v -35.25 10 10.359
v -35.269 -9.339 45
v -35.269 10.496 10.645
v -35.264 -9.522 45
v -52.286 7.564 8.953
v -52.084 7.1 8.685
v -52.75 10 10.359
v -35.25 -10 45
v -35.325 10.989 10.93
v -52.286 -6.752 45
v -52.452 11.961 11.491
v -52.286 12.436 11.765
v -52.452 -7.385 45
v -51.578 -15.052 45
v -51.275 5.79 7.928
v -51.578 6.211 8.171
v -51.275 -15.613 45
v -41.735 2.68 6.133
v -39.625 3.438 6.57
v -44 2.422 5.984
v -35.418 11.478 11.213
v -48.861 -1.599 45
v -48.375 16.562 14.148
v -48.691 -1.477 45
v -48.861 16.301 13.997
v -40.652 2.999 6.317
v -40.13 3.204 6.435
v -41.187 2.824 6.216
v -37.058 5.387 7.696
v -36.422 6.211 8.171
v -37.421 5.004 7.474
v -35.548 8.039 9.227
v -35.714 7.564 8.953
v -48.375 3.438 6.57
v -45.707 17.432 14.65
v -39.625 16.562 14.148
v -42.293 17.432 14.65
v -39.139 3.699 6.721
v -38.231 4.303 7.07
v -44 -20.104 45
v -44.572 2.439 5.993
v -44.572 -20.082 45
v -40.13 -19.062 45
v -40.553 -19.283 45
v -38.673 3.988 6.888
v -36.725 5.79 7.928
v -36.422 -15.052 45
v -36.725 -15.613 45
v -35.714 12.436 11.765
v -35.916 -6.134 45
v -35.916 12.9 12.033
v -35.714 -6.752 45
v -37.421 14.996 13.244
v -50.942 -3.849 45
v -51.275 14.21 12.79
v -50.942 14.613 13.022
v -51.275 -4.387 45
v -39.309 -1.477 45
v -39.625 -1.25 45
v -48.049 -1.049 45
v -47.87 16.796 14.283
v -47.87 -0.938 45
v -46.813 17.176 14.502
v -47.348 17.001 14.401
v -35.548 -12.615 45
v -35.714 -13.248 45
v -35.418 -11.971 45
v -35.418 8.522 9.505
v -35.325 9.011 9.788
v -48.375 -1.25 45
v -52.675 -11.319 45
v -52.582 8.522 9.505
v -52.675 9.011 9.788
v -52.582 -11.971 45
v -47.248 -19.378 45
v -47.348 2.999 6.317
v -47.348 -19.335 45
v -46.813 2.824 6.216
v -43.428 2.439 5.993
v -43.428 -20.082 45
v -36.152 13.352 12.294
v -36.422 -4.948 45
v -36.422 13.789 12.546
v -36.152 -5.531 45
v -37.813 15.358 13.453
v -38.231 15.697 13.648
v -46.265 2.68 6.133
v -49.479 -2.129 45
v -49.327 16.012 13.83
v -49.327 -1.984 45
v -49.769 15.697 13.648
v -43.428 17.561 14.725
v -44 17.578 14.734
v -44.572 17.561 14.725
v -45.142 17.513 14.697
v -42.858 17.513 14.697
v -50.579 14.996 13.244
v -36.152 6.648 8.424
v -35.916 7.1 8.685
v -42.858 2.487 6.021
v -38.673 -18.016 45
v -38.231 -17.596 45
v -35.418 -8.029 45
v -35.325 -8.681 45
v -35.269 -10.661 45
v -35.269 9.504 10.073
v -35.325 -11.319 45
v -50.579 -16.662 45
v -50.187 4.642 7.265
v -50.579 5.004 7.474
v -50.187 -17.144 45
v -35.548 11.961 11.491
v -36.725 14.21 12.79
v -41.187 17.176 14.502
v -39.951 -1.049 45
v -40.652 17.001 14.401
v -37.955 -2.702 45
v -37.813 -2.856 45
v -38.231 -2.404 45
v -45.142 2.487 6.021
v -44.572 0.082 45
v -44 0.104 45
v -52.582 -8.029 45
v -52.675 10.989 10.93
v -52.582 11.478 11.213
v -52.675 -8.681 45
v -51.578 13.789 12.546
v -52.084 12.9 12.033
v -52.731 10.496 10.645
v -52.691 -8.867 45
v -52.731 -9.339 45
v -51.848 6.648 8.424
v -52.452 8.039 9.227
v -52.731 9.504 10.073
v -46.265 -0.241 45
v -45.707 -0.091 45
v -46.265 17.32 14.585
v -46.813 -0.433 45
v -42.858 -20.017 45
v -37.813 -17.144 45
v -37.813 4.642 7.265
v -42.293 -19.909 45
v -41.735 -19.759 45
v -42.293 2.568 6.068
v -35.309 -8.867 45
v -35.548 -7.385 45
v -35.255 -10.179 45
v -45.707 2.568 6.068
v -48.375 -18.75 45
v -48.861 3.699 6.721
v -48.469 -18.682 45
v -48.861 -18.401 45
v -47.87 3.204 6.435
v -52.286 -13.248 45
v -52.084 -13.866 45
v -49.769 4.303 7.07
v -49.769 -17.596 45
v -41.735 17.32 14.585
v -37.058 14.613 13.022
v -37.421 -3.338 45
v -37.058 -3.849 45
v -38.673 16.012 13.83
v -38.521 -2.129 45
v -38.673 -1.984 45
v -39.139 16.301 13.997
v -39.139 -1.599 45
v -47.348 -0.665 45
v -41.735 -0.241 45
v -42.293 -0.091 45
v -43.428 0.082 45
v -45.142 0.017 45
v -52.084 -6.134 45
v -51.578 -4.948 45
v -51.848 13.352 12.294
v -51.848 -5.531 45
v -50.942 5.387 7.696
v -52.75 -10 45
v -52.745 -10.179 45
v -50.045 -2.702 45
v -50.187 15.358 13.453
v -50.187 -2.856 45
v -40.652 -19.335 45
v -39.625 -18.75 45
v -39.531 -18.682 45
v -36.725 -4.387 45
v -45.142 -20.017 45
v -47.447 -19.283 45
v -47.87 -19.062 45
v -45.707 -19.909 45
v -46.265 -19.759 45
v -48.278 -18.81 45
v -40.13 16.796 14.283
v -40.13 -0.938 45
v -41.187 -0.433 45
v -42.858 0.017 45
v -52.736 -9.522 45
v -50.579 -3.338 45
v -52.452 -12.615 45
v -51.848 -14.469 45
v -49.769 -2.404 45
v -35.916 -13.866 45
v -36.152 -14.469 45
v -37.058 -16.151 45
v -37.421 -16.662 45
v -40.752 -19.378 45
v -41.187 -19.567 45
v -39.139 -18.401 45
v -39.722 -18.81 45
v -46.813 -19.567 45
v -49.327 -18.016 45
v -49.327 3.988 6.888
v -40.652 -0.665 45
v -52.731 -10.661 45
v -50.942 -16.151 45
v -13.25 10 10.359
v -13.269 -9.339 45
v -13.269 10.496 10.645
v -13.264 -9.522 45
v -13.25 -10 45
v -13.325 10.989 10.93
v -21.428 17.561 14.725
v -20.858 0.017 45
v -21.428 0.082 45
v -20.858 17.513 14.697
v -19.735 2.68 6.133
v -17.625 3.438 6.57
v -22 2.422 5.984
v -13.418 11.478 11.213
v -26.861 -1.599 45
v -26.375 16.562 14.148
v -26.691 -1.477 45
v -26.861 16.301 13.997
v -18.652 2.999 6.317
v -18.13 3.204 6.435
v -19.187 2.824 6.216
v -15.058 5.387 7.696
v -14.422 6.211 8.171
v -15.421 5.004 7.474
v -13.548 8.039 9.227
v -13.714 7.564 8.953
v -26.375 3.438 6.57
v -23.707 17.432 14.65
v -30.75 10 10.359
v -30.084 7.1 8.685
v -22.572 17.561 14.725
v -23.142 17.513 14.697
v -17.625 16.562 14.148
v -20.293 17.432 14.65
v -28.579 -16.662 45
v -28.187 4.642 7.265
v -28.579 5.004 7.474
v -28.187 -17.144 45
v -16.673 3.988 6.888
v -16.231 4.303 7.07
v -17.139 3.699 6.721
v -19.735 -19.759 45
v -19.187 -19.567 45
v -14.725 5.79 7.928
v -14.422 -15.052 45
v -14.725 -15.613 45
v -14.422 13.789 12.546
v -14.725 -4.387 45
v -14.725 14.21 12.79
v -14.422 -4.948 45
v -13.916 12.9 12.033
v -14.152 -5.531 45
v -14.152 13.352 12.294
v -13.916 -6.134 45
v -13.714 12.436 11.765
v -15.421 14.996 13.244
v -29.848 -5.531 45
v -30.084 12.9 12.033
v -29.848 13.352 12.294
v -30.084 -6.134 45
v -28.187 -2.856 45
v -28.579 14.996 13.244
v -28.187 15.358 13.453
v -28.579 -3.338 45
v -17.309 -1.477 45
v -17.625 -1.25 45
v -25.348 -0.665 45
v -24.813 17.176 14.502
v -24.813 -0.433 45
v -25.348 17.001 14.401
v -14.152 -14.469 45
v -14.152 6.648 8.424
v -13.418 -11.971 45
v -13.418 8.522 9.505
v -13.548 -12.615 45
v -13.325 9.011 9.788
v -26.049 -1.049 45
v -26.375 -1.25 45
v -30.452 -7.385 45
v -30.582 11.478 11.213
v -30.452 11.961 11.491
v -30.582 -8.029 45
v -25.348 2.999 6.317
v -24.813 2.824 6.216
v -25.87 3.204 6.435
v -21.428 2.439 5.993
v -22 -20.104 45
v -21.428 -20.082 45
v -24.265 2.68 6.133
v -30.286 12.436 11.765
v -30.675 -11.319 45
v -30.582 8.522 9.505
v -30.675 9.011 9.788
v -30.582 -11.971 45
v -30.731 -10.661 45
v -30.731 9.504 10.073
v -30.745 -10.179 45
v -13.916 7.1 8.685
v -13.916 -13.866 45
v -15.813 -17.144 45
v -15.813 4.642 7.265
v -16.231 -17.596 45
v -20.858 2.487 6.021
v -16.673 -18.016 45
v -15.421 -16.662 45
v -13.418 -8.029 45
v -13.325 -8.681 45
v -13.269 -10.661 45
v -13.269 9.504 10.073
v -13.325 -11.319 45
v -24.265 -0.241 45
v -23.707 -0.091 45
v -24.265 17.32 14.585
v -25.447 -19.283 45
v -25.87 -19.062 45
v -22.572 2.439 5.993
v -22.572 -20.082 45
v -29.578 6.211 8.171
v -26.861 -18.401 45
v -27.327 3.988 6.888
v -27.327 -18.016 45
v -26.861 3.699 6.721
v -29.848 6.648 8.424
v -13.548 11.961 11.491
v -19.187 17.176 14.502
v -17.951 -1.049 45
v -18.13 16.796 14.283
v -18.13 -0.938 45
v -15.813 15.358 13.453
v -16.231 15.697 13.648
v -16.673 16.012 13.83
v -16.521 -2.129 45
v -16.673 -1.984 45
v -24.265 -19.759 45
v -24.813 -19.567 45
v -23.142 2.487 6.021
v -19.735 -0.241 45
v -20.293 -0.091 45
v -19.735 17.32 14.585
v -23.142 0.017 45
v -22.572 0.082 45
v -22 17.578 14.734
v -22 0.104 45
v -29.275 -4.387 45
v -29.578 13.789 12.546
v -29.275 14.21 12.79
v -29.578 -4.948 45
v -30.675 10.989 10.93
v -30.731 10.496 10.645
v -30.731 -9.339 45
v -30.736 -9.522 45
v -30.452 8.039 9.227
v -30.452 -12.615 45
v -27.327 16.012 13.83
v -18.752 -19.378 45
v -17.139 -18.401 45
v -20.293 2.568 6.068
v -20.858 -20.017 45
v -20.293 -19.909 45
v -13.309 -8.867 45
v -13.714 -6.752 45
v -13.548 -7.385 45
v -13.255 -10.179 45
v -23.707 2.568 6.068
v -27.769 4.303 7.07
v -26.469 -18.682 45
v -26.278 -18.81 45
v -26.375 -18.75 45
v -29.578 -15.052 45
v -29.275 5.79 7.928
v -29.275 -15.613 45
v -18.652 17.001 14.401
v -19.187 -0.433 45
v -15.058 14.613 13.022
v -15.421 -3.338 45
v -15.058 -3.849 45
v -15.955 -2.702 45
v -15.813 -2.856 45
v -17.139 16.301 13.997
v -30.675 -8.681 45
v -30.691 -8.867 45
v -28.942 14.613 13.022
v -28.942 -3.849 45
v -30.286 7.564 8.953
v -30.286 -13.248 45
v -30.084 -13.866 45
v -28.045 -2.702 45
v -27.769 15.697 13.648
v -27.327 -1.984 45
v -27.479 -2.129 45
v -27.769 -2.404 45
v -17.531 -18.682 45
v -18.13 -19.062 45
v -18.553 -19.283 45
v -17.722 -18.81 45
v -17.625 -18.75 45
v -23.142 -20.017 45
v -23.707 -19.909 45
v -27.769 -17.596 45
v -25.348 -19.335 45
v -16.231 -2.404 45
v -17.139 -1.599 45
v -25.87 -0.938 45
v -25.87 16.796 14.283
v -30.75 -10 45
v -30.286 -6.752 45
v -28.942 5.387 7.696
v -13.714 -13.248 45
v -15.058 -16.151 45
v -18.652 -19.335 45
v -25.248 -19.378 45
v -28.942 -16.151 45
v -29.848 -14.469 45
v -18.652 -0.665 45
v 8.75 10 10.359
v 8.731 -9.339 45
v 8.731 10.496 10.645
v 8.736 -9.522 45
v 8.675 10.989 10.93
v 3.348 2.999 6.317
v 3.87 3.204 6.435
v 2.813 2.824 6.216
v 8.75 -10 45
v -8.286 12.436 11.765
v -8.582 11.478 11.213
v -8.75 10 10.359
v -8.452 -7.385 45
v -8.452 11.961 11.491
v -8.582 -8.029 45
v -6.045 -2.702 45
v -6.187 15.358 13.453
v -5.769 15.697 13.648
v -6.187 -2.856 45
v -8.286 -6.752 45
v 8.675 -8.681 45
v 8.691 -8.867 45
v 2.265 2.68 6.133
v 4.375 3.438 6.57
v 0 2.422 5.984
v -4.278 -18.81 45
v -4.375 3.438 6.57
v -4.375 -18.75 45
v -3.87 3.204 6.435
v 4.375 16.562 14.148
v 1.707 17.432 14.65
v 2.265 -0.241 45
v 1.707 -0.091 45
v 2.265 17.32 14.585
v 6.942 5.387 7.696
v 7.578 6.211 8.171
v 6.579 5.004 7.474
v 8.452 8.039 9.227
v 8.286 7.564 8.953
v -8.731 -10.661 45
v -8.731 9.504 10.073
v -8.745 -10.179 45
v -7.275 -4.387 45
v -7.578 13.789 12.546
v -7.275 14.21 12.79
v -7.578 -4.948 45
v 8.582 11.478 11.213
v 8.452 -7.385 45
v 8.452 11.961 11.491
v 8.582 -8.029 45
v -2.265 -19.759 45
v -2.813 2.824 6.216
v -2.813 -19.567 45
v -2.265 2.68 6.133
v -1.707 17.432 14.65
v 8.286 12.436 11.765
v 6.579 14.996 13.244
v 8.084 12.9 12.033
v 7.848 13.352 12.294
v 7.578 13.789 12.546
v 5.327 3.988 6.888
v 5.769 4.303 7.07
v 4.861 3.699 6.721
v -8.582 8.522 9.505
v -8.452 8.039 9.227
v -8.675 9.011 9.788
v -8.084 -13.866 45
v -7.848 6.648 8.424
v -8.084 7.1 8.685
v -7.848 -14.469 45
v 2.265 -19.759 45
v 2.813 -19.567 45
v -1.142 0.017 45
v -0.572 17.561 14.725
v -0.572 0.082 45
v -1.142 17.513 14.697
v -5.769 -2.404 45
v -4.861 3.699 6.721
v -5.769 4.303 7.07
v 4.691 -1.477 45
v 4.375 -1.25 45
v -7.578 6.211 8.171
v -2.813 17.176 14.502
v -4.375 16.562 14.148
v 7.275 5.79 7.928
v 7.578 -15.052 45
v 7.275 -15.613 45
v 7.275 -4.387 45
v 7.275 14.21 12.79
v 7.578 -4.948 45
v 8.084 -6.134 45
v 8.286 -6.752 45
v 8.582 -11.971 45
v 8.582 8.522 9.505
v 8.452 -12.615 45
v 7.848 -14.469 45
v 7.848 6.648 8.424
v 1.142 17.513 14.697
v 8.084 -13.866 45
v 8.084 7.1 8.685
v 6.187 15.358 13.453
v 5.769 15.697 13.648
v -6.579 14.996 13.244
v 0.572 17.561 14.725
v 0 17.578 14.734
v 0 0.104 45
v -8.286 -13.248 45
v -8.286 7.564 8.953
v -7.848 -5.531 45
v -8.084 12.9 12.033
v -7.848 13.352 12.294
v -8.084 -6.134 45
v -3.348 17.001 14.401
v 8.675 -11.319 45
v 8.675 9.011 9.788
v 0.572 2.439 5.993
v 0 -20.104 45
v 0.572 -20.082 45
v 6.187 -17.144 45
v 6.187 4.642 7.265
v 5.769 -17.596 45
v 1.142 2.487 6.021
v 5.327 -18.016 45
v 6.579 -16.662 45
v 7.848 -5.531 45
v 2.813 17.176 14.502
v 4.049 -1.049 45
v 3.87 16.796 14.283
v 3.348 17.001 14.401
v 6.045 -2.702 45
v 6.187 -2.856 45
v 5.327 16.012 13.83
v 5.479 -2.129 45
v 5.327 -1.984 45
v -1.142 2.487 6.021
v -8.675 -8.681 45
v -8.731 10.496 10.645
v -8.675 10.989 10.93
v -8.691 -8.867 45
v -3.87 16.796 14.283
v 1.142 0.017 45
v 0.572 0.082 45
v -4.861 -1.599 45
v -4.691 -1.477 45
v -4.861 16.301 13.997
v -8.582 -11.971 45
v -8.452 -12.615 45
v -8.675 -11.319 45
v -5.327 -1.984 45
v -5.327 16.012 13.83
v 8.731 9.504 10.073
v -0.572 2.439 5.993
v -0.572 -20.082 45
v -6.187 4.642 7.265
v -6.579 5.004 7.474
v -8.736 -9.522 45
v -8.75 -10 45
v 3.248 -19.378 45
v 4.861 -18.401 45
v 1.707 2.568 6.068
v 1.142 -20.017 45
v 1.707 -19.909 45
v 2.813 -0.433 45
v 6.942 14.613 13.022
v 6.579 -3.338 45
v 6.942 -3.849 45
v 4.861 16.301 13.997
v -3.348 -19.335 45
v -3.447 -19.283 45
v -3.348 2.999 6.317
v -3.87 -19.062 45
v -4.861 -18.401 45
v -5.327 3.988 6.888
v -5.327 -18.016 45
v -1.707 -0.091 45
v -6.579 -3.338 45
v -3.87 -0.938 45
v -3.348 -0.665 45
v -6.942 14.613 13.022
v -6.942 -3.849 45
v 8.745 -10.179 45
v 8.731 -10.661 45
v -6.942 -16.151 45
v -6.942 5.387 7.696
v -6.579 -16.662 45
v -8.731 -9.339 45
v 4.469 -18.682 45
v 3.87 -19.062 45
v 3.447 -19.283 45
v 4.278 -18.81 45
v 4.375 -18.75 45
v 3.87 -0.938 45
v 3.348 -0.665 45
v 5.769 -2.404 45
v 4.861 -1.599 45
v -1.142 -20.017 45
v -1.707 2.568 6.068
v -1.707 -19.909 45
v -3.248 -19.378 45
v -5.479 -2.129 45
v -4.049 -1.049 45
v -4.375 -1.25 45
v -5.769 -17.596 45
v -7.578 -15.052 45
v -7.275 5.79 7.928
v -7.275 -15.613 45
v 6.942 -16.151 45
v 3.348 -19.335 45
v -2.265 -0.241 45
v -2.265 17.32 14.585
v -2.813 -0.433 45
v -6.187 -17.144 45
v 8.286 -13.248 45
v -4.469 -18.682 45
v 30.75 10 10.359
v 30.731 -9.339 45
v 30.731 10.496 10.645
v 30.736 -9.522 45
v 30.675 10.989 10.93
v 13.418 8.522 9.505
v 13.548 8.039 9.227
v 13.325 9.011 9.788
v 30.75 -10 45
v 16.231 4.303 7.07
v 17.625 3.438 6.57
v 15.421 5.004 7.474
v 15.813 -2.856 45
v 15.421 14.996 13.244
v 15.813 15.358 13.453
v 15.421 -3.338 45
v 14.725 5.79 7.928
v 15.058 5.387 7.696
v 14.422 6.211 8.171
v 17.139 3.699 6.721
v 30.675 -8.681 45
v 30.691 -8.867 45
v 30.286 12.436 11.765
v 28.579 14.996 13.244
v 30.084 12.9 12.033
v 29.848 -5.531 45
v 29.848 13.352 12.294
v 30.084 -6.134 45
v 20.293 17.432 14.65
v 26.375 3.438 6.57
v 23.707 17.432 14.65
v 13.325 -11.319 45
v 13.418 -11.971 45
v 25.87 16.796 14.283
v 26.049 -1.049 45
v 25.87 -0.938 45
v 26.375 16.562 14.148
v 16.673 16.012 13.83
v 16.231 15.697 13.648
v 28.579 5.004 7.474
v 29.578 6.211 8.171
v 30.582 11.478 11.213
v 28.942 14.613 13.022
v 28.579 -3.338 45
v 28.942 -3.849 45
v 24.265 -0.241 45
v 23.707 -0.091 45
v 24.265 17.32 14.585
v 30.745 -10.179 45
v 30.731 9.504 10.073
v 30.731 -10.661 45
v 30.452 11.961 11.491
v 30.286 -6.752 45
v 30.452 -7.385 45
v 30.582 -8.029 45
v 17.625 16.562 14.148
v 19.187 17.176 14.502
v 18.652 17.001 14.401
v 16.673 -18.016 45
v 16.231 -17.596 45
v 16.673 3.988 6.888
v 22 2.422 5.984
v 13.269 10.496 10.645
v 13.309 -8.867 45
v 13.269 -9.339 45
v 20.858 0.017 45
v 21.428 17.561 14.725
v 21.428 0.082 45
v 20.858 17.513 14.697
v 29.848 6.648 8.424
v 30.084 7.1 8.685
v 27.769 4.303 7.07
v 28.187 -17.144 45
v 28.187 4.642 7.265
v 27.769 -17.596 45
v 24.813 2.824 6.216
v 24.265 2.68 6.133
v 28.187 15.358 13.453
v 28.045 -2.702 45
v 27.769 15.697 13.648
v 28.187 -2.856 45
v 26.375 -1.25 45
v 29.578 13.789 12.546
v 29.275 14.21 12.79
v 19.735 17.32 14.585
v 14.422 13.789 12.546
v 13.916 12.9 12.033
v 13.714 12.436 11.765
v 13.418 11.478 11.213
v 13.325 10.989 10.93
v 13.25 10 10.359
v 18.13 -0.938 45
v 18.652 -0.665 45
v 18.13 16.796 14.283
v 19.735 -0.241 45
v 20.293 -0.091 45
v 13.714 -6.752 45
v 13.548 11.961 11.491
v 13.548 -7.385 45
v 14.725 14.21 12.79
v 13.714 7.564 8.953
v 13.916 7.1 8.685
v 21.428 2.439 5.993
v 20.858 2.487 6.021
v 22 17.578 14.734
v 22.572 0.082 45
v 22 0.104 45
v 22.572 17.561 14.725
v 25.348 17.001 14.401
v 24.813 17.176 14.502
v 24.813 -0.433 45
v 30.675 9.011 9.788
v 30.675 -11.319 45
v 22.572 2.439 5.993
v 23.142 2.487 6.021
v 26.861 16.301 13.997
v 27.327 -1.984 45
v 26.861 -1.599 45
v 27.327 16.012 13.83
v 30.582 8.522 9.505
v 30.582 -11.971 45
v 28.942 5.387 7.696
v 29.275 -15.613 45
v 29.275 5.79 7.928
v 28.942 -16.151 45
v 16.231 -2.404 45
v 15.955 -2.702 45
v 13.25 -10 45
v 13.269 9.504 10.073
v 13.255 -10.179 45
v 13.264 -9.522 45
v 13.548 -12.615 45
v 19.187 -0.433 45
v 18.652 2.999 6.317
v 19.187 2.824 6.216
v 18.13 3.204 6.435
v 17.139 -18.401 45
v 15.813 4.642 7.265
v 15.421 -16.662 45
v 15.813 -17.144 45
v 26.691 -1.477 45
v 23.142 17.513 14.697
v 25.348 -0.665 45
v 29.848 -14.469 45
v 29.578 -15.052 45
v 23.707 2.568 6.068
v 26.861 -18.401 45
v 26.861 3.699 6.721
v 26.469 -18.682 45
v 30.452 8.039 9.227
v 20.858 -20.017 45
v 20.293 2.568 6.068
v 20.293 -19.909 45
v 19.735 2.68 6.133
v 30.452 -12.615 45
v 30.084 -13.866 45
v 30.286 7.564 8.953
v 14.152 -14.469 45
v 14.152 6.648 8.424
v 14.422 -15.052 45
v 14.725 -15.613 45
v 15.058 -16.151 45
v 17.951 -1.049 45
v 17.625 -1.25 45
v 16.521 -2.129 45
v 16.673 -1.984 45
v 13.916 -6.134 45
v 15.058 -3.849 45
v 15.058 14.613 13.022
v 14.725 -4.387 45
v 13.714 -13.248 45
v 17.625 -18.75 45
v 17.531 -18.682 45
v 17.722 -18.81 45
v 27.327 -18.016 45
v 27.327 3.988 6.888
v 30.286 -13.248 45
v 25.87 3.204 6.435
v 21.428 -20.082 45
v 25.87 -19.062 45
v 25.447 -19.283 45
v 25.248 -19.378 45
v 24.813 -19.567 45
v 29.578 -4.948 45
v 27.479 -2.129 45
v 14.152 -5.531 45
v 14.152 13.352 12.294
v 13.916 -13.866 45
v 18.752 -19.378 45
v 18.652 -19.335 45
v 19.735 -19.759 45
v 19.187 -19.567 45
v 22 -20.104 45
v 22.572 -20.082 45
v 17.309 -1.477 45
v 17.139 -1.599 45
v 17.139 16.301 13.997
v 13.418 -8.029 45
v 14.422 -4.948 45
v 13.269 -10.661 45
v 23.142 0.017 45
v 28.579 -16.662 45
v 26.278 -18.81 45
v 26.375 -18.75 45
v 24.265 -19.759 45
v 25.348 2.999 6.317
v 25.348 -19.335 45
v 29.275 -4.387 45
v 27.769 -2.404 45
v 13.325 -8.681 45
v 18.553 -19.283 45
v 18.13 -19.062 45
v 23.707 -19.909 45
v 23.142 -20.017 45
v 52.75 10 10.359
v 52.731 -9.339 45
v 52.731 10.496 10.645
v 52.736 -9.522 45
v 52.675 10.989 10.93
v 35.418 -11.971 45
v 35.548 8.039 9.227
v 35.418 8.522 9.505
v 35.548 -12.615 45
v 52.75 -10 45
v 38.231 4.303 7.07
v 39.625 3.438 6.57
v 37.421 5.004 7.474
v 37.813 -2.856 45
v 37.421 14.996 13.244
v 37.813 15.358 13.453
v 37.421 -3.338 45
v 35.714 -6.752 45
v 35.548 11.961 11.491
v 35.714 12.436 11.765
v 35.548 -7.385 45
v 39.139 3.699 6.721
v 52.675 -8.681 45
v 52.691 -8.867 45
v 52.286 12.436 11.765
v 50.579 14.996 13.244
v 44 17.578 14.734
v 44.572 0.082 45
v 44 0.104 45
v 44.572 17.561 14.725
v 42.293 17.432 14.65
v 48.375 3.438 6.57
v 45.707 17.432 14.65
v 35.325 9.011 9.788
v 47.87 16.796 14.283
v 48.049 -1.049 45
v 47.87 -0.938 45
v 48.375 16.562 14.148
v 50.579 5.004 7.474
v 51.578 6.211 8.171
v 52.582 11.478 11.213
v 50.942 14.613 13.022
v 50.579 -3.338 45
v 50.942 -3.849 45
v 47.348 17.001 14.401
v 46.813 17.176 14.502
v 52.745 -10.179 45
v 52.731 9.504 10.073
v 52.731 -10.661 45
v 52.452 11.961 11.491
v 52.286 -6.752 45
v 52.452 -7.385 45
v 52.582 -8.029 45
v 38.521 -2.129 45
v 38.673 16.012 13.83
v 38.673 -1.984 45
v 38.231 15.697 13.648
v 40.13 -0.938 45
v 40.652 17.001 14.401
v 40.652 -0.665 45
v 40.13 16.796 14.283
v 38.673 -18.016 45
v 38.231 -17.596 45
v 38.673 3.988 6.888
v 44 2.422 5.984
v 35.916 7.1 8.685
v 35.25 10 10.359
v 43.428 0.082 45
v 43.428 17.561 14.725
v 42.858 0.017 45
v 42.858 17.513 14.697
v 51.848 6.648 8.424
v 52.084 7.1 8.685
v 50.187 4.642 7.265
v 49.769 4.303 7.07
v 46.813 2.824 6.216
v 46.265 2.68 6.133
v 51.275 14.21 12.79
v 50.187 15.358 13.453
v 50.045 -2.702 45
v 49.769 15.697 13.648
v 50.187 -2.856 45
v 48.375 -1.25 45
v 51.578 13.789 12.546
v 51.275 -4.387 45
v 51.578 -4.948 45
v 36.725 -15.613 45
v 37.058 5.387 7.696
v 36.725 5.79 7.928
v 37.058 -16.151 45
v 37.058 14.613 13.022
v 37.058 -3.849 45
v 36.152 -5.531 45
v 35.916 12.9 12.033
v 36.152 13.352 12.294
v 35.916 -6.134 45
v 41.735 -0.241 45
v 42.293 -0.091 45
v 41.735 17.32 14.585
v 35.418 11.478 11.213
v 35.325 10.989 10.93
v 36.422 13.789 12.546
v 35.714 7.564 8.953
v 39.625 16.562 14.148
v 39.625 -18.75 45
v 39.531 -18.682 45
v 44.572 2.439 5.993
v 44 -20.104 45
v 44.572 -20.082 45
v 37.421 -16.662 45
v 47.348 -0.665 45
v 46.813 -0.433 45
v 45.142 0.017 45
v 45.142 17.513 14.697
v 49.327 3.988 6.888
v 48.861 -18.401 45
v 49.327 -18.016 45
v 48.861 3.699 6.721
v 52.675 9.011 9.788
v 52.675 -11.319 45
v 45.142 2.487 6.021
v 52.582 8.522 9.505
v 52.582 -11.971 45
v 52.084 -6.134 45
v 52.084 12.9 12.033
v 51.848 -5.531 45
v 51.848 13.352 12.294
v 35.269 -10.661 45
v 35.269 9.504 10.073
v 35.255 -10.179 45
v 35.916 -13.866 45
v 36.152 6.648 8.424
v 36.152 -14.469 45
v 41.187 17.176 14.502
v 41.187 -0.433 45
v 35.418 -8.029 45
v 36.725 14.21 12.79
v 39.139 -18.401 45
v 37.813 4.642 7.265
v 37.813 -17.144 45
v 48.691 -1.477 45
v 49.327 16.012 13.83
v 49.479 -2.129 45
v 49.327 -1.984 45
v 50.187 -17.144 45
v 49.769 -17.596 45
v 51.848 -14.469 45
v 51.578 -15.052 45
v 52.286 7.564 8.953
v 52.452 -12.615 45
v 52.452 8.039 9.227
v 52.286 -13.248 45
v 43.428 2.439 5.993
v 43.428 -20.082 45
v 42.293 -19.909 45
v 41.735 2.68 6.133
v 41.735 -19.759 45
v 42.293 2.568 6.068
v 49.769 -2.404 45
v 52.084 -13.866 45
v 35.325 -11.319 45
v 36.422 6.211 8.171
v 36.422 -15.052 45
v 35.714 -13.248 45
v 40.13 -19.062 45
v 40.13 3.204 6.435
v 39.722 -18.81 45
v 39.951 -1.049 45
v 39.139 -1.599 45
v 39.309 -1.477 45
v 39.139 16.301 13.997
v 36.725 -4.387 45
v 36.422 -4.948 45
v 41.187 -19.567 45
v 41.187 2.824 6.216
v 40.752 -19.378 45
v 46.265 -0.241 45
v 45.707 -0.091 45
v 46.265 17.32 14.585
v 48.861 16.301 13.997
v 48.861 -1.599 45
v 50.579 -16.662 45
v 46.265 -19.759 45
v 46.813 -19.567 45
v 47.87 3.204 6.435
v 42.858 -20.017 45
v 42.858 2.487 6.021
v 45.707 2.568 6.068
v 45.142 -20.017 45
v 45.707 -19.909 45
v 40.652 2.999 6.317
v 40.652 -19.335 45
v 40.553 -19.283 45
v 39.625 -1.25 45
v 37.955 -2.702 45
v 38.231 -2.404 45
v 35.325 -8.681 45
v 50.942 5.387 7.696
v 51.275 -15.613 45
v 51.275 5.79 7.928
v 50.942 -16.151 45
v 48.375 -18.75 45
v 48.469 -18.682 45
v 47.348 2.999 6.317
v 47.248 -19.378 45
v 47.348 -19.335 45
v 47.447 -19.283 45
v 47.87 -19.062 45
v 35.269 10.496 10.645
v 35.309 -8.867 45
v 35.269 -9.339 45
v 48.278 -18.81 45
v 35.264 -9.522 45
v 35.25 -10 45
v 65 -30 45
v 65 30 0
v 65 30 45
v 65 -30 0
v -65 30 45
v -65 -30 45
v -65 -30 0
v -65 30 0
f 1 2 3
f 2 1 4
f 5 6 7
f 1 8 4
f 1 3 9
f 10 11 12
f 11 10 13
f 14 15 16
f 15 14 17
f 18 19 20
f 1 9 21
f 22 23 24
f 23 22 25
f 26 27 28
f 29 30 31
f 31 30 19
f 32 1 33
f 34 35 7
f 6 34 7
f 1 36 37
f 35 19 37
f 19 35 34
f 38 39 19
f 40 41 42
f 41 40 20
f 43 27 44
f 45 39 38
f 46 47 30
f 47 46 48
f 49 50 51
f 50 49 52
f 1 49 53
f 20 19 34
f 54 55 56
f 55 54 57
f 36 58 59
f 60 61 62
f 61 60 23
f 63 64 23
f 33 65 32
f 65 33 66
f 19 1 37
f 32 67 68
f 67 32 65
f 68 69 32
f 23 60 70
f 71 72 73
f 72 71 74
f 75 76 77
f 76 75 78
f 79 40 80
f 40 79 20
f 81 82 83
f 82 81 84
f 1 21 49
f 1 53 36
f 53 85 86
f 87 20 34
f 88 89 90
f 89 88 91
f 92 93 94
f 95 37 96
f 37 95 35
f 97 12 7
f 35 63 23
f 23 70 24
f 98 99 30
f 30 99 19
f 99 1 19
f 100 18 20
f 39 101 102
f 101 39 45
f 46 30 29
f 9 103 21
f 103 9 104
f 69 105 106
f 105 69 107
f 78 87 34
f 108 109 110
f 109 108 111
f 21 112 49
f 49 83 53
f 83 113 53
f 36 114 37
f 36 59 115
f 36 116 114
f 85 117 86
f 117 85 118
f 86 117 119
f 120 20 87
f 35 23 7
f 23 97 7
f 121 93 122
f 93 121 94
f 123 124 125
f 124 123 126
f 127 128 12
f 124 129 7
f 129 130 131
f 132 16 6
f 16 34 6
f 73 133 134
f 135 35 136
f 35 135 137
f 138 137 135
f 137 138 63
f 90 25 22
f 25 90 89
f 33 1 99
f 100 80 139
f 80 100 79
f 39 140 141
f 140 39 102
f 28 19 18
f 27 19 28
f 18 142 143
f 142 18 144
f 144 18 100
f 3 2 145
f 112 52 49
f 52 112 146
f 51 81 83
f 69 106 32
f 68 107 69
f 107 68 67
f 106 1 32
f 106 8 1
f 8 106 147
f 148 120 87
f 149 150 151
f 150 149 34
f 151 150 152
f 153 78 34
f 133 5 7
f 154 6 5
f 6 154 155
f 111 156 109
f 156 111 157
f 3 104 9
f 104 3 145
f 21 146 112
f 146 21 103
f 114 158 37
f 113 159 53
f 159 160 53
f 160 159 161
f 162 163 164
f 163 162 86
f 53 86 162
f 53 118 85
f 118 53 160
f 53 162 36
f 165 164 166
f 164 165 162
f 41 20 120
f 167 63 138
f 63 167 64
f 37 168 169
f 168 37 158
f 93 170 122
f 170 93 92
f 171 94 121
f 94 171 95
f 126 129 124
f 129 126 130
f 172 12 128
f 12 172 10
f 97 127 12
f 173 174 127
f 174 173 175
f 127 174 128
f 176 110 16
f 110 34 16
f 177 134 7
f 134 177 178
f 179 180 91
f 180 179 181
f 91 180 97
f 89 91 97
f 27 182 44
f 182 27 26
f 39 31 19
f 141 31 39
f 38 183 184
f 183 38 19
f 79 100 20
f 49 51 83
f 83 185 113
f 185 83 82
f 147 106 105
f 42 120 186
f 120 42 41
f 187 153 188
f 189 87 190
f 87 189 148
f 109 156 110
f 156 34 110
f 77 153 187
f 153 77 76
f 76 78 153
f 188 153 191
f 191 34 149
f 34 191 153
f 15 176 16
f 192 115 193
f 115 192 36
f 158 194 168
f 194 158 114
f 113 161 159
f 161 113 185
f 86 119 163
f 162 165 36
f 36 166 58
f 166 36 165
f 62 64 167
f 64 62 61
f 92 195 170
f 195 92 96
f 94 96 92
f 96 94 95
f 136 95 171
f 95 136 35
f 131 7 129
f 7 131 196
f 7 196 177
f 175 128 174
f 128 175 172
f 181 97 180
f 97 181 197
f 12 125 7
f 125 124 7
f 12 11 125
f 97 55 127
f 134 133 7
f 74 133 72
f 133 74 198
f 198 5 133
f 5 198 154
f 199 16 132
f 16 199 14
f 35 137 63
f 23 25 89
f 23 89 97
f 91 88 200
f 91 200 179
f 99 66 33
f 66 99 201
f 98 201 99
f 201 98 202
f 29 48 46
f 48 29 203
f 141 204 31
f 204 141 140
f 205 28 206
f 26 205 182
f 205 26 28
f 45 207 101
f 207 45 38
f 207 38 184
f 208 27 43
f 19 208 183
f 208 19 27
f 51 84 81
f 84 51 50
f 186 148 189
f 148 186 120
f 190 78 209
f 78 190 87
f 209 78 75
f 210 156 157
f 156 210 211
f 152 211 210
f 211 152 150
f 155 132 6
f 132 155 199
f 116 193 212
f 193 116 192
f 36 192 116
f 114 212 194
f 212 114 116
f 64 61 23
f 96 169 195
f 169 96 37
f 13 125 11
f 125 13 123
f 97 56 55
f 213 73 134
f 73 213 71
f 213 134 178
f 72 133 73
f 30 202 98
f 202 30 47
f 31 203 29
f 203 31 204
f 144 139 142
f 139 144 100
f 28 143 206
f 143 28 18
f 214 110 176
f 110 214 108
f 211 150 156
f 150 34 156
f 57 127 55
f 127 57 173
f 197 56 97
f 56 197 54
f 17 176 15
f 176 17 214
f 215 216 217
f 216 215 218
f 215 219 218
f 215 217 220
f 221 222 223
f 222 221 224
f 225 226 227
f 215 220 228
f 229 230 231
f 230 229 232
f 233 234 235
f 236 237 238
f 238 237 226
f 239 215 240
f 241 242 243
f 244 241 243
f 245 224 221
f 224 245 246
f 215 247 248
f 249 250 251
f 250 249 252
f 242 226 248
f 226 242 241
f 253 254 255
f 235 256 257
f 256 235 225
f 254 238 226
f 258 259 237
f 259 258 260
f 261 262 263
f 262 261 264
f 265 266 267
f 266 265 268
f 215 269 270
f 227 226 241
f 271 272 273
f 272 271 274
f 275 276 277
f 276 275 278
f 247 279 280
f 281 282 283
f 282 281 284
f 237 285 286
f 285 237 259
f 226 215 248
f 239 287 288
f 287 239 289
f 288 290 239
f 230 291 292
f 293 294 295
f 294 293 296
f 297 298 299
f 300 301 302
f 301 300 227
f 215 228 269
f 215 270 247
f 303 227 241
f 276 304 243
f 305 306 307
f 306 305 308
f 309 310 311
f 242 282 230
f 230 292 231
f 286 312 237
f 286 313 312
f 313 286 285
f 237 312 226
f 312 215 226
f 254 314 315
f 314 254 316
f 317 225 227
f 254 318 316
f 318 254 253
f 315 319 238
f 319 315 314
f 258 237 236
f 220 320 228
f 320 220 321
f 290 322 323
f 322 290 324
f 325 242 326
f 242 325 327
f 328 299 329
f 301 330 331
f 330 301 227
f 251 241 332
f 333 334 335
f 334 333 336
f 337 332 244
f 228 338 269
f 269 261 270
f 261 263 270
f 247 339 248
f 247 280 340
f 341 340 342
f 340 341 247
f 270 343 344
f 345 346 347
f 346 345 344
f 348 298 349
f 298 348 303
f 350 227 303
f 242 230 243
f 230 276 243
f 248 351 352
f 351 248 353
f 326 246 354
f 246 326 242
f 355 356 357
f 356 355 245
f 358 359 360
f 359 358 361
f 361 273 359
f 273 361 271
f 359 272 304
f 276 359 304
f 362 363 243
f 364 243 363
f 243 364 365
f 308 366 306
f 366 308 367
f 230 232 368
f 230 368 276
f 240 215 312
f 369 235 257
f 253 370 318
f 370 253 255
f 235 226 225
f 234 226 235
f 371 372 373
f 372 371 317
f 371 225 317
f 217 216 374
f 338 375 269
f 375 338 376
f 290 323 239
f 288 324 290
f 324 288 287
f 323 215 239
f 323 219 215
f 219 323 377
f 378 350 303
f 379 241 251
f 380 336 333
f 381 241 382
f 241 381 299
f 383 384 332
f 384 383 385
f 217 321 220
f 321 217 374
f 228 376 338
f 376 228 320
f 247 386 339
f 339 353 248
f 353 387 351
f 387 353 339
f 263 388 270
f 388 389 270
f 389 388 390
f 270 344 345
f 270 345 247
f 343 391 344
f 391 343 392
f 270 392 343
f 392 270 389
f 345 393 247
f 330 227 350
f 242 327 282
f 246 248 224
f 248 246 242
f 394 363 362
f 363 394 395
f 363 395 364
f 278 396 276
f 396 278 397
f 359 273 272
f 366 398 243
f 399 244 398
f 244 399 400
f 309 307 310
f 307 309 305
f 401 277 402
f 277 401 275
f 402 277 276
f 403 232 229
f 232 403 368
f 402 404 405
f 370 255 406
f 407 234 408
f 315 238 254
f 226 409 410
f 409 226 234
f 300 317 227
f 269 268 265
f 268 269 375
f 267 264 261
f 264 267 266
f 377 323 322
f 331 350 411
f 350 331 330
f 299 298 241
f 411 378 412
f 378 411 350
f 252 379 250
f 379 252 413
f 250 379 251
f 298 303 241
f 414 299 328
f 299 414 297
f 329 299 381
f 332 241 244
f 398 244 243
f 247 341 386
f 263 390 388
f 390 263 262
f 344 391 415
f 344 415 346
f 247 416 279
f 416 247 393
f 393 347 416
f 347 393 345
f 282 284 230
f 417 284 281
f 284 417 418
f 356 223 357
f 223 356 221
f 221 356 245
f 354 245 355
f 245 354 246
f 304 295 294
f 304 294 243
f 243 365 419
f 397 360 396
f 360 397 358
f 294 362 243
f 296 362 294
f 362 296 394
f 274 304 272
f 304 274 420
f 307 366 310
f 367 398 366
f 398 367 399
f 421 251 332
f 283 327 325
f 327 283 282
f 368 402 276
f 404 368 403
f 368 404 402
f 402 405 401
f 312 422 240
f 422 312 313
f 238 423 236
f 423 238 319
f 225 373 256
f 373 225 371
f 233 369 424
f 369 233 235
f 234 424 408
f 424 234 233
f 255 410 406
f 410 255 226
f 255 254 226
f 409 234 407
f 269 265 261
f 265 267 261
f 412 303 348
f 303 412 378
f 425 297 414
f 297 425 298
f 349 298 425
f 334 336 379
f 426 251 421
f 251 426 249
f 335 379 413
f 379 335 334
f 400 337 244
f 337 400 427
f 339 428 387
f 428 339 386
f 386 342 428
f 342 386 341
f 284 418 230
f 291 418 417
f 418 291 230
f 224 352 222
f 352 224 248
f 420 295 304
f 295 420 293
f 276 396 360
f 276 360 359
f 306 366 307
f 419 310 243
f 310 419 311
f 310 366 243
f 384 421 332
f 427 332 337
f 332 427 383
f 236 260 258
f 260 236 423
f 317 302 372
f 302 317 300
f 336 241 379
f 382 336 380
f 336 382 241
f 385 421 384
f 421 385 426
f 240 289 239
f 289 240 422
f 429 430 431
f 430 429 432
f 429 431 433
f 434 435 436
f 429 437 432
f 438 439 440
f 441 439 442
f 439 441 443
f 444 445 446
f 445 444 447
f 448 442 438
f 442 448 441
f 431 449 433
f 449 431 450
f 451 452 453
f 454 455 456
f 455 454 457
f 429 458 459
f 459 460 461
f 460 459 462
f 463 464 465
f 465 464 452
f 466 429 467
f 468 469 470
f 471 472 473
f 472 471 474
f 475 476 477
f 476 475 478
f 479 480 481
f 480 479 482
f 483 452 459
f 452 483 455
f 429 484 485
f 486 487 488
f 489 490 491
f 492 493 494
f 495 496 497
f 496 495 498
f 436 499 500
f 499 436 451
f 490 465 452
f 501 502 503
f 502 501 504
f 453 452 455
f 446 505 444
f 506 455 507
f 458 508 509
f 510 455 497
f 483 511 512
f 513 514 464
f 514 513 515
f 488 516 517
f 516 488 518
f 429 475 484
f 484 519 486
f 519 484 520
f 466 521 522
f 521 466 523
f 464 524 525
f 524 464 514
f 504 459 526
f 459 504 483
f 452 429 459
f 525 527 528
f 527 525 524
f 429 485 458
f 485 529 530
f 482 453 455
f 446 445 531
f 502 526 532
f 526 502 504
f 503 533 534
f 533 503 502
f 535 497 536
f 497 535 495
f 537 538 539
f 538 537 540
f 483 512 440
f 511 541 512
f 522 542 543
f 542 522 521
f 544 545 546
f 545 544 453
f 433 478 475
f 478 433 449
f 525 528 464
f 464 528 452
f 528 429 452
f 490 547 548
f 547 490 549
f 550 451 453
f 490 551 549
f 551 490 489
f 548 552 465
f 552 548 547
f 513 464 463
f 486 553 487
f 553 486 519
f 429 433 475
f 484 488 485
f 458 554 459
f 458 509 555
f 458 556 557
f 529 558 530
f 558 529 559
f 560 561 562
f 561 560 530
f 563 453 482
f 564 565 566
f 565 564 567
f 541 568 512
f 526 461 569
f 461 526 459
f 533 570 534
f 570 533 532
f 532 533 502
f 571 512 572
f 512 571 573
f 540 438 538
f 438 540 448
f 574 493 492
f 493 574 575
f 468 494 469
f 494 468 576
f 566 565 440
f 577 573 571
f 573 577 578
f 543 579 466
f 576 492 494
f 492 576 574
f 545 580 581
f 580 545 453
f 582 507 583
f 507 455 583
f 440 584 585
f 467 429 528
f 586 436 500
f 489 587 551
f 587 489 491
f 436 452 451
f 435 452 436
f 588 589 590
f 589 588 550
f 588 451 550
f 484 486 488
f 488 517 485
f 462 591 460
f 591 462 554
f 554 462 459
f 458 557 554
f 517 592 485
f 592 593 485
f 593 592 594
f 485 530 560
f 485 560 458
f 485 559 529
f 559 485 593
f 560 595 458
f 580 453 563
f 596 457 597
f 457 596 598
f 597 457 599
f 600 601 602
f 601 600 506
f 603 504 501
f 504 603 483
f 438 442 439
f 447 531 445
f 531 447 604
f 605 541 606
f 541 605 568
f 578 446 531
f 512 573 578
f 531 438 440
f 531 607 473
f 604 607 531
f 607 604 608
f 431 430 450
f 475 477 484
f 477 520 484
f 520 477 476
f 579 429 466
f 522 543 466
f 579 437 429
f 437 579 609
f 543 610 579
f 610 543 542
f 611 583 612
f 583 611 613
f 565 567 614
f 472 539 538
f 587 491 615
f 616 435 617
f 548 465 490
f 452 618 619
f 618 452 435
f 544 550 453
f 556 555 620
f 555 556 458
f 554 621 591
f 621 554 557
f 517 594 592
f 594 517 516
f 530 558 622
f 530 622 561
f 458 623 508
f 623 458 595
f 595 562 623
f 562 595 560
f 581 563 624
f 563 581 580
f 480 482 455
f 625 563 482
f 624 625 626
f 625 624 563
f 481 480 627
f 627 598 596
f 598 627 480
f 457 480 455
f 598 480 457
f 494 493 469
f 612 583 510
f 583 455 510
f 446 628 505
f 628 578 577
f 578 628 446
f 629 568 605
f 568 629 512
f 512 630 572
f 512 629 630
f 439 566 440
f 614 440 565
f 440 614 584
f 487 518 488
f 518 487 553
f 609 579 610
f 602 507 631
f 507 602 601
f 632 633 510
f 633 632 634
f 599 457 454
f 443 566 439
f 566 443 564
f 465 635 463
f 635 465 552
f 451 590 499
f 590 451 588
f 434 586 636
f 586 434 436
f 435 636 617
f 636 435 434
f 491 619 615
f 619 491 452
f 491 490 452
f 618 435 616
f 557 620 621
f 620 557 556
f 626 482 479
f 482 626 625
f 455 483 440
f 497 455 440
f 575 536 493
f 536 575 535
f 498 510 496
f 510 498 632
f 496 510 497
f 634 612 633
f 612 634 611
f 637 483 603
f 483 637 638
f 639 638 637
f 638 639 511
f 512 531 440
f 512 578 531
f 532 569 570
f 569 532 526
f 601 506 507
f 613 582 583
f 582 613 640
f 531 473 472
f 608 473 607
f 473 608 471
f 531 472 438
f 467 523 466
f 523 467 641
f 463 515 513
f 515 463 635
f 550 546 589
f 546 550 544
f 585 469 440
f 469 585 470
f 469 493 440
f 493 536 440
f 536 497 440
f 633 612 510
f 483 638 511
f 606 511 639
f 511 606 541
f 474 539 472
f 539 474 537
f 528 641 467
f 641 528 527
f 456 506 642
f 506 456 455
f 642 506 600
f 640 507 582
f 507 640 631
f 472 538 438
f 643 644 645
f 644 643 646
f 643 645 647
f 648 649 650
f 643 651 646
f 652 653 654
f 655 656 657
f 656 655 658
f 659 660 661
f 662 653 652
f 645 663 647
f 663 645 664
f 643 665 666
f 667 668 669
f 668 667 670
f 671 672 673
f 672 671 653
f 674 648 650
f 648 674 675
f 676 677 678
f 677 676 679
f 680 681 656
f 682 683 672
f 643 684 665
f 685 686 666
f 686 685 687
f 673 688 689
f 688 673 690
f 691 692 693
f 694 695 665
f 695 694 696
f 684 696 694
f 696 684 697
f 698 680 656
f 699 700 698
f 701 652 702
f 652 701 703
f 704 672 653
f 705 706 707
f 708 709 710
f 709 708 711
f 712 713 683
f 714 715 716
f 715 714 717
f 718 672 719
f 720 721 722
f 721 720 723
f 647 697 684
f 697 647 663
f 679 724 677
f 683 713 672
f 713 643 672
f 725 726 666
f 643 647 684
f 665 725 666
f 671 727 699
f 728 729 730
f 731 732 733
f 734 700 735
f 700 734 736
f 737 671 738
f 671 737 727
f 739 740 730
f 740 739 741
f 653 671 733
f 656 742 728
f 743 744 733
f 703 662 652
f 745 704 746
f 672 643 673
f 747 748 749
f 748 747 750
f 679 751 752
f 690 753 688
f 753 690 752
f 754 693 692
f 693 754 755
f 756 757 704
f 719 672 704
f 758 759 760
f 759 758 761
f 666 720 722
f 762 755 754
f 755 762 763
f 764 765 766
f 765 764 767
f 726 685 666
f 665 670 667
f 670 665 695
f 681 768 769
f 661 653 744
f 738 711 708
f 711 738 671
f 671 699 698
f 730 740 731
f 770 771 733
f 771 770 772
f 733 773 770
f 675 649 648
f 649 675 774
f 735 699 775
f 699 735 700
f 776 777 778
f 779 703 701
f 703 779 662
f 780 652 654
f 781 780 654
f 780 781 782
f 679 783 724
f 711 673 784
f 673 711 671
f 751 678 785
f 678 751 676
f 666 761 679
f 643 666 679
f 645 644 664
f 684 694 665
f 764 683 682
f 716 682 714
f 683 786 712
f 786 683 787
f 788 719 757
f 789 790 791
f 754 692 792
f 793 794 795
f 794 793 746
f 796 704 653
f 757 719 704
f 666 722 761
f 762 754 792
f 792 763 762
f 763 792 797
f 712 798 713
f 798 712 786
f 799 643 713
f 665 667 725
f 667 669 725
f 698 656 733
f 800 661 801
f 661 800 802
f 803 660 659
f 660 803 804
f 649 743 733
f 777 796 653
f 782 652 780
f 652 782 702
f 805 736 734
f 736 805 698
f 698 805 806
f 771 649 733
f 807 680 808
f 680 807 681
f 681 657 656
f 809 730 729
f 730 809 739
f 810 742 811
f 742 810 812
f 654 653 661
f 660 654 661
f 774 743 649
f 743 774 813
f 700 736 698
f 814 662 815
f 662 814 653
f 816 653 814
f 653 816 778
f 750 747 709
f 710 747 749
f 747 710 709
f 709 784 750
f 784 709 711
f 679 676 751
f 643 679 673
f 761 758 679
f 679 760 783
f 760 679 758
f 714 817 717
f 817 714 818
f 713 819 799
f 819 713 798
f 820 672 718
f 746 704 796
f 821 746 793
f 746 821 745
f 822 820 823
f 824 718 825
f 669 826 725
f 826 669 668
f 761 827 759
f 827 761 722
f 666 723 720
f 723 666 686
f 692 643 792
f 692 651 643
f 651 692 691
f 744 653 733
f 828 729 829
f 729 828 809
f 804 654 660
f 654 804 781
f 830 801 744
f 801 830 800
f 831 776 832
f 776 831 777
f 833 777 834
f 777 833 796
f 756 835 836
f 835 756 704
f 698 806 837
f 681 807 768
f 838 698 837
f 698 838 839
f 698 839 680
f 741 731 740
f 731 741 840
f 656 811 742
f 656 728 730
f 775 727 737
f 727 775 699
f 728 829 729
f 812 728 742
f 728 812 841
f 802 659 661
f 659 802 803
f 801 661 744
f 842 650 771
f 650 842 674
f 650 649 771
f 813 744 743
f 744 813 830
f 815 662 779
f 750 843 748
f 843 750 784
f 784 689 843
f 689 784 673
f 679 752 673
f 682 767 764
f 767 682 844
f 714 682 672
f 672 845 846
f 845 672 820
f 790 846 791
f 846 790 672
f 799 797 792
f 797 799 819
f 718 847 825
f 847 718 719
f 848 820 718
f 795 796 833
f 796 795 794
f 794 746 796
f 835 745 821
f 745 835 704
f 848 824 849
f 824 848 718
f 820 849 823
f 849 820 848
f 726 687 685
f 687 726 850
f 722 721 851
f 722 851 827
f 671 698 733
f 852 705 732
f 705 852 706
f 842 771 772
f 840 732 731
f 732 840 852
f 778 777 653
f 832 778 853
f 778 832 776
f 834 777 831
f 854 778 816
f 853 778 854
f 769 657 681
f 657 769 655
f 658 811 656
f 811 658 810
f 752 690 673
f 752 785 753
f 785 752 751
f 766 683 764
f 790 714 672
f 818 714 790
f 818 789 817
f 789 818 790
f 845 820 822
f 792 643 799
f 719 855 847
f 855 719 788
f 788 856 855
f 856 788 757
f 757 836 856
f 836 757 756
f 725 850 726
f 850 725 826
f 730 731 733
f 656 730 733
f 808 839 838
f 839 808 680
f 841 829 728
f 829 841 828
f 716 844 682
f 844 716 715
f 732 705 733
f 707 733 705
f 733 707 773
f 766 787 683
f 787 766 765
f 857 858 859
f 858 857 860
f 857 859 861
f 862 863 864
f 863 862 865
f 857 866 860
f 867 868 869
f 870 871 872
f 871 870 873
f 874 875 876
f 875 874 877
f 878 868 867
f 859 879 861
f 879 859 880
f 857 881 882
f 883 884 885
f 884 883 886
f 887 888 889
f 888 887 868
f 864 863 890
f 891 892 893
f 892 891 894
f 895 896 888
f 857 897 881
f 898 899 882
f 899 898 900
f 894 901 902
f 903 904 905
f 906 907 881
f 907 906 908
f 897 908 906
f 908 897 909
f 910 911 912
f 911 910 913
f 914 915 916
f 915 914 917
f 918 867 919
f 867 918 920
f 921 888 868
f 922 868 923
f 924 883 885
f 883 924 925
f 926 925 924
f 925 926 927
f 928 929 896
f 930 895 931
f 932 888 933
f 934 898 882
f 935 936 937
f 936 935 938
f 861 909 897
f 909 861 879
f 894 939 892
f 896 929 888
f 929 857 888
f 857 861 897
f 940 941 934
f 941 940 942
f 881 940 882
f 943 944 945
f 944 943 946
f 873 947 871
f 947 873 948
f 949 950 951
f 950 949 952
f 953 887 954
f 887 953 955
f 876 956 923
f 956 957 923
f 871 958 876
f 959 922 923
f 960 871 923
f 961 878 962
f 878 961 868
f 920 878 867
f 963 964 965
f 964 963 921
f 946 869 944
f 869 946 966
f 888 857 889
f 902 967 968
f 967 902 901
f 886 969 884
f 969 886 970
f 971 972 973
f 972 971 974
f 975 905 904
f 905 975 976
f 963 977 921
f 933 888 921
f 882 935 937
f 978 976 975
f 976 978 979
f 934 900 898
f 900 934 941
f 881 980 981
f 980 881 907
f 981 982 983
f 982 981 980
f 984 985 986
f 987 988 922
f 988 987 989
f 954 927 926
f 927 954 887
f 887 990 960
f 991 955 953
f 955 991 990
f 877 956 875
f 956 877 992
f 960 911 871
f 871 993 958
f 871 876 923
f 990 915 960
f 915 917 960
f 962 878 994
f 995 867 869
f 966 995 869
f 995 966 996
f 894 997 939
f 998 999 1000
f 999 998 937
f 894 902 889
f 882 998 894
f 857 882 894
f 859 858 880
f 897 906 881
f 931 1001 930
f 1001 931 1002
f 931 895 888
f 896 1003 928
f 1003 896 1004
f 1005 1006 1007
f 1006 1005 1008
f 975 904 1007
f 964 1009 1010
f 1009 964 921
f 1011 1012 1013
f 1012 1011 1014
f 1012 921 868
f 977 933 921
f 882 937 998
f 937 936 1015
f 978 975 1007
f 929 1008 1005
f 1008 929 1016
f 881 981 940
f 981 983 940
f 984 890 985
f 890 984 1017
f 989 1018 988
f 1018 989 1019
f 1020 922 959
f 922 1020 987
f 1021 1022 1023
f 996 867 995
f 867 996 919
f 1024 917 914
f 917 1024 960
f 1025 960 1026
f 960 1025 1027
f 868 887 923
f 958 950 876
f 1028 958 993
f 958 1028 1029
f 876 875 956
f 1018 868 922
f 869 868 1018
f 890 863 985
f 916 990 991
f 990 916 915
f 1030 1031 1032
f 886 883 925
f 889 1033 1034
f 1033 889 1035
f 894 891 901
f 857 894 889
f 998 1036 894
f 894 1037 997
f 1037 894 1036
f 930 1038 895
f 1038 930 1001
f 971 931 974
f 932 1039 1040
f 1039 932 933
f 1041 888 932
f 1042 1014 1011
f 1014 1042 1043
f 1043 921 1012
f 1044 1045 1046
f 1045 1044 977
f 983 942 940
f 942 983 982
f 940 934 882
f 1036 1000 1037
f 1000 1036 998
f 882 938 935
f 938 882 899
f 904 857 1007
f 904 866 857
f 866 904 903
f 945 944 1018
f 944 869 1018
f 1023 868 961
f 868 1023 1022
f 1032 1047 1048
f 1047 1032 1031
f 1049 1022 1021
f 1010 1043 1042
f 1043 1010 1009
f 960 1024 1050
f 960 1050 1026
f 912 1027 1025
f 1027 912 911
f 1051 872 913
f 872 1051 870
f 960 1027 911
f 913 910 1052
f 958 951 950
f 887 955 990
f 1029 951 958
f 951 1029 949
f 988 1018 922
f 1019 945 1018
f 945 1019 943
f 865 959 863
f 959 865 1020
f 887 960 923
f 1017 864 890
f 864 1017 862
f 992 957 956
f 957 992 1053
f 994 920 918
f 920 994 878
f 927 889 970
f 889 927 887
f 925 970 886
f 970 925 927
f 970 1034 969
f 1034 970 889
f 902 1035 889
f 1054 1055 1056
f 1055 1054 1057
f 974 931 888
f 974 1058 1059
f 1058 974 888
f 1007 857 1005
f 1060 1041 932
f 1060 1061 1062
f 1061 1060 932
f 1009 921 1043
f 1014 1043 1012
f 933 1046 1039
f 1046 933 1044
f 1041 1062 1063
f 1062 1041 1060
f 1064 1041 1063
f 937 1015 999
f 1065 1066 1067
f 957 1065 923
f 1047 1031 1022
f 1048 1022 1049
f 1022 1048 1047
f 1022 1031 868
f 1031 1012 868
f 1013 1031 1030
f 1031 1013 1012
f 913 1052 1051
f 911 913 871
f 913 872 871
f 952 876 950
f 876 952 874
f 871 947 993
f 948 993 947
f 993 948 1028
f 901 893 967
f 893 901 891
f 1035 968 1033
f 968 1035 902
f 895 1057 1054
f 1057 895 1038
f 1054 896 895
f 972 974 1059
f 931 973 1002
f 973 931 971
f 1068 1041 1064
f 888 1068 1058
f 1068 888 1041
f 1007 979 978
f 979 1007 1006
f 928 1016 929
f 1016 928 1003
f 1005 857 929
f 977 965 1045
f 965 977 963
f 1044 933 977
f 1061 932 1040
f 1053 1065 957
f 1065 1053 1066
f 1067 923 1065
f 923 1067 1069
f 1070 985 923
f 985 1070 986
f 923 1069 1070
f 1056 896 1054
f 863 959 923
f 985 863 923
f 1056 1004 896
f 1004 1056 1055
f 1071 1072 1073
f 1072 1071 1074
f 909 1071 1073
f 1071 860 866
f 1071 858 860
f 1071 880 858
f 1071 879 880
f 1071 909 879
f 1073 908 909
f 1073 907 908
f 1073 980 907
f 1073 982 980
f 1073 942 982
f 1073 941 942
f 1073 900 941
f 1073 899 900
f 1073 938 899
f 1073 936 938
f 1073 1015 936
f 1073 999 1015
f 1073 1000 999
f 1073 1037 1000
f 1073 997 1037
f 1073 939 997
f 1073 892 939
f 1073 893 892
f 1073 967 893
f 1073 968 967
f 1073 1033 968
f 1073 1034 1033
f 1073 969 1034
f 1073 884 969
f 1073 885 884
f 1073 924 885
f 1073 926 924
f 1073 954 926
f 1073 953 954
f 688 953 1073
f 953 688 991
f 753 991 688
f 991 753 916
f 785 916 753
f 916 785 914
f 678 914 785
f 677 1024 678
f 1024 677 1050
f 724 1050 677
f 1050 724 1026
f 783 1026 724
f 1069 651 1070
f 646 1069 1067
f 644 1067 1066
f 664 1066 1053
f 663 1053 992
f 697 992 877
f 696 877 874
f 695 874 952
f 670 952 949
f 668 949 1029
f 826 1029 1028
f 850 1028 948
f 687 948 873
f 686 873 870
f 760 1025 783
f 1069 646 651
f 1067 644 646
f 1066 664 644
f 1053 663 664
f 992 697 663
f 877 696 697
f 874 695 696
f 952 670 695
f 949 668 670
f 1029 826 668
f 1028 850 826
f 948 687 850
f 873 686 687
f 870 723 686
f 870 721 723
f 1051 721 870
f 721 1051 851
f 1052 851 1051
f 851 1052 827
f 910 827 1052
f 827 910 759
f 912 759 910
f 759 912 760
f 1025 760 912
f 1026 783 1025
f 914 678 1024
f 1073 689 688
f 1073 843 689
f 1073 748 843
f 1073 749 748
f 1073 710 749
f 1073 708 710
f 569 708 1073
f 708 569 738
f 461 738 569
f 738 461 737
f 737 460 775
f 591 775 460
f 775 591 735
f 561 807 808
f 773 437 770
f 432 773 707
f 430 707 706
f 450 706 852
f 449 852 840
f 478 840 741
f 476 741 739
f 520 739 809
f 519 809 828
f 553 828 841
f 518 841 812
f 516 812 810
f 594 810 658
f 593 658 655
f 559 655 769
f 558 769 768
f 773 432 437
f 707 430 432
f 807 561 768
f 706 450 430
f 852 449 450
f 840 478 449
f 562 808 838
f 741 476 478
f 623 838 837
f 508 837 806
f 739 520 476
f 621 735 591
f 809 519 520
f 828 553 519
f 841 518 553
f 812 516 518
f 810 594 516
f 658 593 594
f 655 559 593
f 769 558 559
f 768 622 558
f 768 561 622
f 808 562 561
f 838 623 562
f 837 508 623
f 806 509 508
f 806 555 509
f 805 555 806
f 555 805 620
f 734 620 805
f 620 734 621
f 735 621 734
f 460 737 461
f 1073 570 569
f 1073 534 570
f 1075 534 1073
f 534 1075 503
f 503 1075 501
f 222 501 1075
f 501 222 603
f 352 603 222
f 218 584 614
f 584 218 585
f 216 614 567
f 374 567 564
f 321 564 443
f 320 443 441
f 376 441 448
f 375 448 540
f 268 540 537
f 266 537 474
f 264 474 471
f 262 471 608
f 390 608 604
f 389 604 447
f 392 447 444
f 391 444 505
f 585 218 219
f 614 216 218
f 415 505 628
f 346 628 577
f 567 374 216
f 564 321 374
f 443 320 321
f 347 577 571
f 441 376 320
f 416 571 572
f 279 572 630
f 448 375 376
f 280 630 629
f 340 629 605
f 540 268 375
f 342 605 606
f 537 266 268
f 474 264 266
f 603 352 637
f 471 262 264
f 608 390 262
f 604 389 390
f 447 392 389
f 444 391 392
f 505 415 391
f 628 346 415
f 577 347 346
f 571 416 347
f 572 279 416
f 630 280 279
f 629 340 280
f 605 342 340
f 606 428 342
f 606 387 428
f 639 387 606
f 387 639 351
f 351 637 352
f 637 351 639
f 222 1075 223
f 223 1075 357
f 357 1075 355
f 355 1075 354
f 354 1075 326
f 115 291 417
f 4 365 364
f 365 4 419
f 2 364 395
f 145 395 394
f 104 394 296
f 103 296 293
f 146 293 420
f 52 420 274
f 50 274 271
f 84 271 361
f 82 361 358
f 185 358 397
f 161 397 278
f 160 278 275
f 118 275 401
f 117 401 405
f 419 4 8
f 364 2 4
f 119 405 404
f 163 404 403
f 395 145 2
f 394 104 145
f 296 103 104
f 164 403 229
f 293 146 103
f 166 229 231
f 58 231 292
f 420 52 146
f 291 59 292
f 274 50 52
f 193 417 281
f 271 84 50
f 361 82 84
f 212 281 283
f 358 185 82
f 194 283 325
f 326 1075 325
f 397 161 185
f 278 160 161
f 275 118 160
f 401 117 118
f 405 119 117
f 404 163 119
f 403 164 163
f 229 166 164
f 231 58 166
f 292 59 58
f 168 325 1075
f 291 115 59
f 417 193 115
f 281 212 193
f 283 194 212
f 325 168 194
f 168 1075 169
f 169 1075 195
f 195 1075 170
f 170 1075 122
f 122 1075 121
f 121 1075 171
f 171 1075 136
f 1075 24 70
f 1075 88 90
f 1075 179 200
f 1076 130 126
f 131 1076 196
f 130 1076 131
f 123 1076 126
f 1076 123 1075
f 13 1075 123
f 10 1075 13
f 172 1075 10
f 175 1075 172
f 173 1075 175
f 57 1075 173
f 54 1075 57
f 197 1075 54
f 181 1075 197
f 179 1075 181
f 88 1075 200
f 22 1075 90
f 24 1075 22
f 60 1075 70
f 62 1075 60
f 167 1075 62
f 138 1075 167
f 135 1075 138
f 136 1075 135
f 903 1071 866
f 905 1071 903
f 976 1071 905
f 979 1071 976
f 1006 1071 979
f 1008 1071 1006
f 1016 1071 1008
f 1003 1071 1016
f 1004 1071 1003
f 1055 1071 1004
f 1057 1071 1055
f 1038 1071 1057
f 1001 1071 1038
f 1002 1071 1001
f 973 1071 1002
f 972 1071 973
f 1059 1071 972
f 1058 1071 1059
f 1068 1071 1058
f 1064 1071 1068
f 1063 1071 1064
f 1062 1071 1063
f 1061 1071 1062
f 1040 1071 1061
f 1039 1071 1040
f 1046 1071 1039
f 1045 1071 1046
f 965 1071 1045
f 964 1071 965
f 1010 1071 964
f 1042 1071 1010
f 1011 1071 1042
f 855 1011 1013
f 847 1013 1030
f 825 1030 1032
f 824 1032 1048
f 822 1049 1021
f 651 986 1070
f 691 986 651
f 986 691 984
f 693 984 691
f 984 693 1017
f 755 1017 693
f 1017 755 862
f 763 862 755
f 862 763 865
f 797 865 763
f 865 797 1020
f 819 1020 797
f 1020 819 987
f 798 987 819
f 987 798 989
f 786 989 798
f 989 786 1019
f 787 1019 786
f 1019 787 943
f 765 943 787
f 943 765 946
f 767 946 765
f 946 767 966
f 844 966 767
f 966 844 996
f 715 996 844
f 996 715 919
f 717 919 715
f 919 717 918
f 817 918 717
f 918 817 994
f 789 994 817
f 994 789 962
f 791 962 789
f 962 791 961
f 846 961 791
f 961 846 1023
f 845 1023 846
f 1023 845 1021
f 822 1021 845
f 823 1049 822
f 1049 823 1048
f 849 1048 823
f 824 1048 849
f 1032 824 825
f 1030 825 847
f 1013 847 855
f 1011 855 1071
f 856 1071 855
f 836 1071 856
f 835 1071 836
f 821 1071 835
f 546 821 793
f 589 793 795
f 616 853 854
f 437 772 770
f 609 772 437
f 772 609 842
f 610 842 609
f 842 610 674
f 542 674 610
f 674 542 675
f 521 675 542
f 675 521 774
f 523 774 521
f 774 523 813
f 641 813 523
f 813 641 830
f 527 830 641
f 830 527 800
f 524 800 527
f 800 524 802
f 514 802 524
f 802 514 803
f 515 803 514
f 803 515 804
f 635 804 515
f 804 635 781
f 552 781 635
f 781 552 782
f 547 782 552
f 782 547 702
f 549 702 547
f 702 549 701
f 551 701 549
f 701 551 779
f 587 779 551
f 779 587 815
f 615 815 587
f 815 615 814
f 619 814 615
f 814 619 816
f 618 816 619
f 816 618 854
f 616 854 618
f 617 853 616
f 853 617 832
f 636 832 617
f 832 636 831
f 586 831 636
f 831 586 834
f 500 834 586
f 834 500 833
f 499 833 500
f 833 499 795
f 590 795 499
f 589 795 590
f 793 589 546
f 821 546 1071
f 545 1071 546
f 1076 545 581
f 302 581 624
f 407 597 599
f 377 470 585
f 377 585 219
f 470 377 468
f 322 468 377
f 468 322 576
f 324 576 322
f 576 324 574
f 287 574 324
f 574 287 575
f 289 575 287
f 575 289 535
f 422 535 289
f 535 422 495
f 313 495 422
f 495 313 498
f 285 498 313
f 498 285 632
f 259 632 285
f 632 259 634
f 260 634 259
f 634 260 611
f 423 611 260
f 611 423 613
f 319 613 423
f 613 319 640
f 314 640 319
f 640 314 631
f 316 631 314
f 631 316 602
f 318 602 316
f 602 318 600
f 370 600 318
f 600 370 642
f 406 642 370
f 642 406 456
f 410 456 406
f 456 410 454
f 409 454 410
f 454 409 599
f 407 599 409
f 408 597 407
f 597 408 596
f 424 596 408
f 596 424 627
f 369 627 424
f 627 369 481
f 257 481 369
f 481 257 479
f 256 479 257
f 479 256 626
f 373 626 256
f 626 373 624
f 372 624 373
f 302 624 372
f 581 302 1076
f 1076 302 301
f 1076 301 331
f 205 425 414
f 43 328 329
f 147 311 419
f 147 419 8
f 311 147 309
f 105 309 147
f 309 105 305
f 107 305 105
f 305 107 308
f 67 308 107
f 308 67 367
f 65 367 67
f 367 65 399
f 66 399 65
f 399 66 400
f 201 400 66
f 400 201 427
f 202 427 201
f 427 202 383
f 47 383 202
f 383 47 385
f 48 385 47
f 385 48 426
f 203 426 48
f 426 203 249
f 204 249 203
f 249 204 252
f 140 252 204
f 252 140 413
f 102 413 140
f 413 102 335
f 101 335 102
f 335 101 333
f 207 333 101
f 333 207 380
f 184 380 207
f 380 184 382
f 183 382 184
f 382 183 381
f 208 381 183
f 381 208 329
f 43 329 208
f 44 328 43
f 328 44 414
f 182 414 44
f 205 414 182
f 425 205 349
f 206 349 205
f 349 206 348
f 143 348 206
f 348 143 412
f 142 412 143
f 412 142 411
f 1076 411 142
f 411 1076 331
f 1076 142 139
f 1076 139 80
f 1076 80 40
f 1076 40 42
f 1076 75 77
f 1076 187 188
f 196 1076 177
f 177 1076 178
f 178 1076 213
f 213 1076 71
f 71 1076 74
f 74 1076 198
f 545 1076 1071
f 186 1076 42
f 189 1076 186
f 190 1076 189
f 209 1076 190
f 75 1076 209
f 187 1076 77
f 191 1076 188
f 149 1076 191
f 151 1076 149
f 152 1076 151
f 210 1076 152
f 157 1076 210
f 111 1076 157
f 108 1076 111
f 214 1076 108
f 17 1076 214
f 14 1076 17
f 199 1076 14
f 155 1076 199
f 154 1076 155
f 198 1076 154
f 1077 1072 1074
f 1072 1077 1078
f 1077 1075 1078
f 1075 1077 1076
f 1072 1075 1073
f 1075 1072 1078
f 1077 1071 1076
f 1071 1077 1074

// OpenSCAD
// KNOWN-WRONG PART (must fail): the holes are 22 mm apart instead of 24
// Rack that holds five 15 mL conical tubes at a 30-degree lean (reading volumes, pipetting off
// supernatant). Category: benchware. A solid block with five blind holes tilted 30 degrees from
// vertical; the hole roofs overhang at 60 degrees from horizontal, so it prints without supports.
// Print: PLA or PETG, standing on the bed, 0.2 mm layers, 15 % infill.
// SPDX-License-Identifier: CERN-OHL-P-2.0

/* [Rack] */
block = [130, 60, 45];    // X, Y, Z [mm], centred in X and Y
n = 5;
pitch = 22;               // along X
hole_d = 17.5;            // square to the axis
tilt = 30;                // degrees from vertical; going down, the hole moves toward +Y
entry_y = -10;            // the axis meets the top face at y = -10
depth = 40;               // along the axis, flat end square to the axis

/* [Hidden] */
eps = 0.01;

difference() {
    translate([-block.x / 2, -block.y / 2, 0]) cube(block);
    for (i = [0 : n - 1])
        translate([(i - (n - 1) / 2) * pitch, entry_y, block.z])
            rotate([tilt, 0, 0])            // local +Z (up the hole) -> (0, -sin, cos)
                translate([0, 0, -depth]) cylinder(d = hole_d, h = depth + 15, $fn = 96);
}
